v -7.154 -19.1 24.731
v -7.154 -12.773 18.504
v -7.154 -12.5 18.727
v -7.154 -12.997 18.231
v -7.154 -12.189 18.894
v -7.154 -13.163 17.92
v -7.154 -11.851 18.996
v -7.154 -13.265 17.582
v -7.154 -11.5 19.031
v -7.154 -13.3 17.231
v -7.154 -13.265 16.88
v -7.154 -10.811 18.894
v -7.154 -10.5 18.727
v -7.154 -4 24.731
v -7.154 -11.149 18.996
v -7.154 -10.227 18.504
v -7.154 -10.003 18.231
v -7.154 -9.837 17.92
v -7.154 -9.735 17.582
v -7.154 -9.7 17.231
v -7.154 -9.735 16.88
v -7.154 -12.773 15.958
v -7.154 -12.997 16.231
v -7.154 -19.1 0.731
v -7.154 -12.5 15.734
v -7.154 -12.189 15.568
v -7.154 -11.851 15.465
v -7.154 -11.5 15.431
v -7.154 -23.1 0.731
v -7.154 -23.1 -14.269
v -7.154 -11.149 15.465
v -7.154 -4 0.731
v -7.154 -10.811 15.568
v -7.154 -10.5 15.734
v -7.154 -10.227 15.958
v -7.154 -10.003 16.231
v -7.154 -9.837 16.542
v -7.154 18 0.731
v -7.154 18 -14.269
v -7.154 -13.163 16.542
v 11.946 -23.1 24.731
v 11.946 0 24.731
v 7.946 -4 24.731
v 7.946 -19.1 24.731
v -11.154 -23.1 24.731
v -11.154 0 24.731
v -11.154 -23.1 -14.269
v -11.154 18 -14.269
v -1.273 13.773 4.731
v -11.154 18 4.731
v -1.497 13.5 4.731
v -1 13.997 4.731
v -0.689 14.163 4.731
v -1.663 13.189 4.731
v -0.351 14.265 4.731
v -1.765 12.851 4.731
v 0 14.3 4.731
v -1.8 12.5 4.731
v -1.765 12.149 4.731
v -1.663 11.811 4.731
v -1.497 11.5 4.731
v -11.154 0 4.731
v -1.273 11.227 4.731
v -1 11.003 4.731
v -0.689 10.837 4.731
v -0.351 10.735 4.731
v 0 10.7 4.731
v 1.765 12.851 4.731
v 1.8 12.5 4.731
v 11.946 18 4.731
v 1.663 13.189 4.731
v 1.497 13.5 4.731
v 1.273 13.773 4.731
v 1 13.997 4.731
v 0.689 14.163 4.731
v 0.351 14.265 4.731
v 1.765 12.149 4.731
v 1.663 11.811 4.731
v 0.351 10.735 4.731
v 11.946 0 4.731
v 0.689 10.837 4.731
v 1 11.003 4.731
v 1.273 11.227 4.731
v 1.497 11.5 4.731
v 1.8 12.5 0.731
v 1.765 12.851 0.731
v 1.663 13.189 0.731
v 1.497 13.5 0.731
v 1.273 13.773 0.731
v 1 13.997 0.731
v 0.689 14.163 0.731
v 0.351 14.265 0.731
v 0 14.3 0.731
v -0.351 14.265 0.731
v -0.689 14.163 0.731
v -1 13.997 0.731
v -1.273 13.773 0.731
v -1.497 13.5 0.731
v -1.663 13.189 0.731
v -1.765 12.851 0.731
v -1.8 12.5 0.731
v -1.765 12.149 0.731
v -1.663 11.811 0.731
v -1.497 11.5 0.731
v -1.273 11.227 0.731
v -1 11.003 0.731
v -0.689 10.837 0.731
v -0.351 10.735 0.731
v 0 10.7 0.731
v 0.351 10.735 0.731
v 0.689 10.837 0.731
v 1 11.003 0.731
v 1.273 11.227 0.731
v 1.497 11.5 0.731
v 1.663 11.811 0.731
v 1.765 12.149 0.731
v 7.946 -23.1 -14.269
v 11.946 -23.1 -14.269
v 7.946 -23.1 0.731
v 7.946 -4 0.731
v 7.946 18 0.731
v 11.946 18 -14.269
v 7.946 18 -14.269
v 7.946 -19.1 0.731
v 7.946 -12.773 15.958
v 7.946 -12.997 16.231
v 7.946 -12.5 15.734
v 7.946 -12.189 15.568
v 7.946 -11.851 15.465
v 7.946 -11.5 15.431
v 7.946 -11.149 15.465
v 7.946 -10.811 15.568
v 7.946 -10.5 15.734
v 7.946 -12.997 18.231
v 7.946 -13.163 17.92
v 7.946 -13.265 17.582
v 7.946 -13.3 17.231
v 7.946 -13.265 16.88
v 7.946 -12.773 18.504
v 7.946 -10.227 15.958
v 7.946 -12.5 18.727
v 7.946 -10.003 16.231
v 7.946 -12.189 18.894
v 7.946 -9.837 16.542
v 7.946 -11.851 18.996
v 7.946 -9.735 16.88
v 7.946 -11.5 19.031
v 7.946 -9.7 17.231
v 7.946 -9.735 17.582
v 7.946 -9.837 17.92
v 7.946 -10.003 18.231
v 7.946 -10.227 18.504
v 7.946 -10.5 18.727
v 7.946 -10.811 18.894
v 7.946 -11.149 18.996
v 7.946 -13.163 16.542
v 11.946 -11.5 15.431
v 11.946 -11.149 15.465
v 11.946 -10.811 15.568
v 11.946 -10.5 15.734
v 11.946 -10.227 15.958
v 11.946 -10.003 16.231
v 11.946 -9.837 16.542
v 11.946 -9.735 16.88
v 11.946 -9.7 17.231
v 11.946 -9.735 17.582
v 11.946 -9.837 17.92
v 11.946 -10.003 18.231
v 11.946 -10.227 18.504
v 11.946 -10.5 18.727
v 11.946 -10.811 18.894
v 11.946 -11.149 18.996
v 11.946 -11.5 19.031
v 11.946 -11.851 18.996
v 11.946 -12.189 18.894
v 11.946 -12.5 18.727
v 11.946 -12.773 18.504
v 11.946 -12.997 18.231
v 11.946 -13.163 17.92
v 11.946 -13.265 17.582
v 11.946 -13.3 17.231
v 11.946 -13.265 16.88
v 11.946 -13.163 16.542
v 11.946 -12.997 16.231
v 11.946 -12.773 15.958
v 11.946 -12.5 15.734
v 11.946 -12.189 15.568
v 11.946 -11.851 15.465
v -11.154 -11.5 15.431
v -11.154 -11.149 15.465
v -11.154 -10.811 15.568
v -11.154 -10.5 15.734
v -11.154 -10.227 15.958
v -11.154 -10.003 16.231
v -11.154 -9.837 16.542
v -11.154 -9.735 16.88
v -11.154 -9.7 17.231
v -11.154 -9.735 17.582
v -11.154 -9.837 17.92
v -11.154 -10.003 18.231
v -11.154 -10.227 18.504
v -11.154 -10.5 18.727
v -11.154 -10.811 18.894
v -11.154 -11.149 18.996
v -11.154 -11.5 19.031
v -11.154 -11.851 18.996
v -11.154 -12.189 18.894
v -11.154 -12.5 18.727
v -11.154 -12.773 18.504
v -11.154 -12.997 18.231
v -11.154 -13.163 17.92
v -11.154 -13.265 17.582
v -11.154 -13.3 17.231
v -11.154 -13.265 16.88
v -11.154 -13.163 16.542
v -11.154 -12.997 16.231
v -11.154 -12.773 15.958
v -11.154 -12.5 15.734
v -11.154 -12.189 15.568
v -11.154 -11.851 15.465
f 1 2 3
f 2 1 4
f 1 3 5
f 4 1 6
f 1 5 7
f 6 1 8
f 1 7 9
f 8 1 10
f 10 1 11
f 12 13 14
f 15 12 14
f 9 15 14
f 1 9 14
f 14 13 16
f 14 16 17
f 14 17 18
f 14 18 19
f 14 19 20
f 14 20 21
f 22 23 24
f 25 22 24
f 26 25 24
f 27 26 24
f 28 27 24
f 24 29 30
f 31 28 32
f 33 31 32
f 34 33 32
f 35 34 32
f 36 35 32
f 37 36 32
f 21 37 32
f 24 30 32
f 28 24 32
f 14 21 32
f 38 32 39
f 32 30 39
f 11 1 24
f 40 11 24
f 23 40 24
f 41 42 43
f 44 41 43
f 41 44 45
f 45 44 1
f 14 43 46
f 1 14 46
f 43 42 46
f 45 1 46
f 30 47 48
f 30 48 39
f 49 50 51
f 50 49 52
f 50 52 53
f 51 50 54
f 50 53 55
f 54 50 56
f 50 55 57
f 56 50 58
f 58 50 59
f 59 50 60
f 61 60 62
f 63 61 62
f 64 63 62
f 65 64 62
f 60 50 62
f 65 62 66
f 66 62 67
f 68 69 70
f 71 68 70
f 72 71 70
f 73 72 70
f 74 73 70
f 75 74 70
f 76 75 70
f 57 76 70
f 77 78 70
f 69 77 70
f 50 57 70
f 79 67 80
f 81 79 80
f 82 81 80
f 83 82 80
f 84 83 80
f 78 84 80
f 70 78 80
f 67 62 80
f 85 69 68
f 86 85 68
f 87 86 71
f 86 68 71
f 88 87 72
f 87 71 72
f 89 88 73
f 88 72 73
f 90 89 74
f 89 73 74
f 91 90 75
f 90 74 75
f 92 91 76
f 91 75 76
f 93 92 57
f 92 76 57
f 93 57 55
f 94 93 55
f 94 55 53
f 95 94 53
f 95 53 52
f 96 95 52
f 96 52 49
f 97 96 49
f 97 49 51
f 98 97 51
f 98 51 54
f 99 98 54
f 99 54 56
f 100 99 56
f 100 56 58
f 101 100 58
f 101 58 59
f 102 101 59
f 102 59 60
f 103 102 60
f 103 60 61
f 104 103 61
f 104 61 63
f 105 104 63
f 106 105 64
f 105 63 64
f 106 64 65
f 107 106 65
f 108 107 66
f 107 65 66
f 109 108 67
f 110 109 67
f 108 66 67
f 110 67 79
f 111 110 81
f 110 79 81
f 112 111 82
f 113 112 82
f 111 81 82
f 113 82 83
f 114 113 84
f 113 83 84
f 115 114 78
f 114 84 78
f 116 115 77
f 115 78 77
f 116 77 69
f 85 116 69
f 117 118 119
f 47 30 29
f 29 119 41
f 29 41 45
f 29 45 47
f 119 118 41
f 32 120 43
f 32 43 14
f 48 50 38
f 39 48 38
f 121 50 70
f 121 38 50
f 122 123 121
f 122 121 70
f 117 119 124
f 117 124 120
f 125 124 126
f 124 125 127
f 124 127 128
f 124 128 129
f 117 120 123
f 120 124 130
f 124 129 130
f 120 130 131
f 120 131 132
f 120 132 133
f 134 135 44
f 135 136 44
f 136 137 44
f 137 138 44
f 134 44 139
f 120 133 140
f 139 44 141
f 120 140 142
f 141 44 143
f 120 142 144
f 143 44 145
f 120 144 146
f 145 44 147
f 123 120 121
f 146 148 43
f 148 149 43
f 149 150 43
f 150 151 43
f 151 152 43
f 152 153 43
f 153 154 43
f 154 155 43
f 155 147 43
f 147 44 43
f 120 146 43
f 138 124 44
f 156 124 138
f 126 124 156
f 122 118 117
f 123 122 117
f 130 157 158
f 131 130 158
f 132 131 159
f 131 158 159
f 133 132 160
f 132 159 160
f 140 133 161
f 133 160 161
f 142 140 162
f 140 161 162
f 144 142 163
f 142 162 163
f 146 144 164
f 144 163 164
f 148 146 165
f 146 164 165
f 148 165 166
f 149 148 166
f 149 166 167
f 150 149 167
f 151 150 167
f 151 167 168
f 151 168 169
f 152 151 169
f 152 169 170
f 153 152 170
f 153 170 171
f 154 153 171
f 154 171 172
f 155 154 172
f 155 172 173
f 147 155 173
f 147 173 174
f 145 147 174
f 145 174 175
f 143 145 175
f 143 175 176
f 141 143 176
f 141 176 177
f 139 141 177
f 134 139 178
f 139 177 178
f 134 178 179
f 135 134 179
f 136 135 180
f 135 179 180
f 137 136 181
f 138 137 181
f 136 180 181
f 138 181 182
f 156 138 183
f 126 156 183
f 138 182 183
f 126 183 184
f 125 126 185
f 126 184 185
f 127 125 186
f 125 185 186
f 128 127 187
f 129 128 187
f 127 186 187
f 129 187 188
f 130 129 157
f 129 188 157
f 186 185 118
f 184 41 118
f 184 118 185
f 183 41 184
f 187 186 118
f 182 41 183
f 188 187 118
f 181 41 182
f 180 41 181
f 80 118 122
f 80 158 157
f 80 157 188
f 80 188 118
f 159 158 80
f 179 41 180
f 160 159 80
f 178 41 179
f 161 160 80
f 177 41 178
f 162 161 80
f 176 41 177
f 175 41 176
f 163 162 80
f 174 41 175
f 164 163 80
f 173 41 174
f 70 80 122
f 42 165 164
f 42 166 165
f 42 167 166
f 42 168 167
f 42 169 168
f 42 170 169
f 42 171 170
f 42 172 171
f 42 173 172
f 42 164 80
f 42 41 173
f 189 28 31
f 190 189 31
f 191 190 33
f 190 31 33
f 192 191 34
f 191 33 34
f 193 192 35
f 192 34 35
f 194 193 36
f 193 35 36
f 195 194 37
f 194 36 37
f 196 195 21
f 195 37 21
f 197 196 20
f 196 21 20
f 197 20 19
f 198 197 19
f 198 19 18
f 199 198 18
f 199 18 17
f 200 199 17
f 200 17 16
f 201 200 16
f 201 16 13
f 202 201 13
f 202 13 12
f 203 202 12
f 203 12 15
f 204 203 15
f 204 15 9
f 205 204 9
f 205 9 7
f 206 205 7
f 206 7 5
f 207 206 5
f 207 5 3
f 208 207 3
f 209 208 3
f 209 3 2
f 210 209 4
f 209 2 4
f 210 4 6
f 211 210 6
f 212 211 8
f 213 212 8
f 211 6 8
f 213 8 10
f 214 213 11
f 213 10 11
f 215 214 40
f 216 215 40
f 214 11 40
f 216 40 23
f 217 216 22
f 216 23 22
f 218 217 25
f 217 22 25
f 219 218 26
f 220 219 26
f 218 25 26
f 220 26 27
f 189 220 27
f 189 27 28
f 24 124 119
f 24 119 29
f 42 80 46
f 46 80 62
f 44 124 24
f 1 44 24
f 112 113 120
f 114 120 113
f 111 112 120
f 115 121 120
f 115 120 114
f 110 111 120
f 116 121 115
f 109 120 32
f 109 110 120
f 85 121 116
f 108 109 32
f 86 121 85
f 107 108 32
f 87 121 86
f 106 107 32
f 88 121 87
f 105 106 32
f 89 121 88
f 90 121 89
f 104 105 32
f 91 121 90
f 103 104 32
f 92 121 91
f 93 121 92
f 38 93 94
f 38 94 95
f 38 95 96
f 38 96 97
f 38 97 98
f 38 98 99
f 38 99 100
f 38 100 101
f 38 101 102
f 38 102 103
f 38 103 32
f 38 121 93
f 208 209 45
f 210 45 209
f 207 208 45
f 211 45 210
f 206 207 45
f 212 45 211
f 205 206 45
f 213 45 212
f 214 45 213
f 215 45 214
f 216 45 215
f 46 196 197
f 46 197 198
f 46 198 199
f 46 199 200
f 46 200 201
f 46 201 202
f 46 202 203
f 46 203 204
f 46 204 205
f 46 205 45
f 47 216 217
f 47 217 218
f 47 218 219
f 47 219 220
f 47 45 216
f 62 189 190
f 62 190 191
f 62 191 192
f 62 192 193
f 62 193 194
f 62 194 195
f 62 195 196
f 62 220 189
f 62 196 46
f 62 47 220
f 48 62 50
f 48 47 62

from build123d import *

# Parameters (mm, degrees)
EXTRUDE_1_DEPTH     = 20
SKETCH_2_W          = 23.1
SKETCH_2_H          = 23.1
SKETCH_2_W_2        = 15.1
SKETCH_2_H_2        = 15.1
EXTRUDE_2_DEPTH     = 24
SKETCH_3_W          = 4
SKETCH_3_H          = 23.1
EXTRUDE_3_DEPTH     = 15
SKETCH_4_R          = 1.8
CUT_EXTRUDE_1_DEPTH = 15
SKETCH_5_R          = 1.8
CUT_EXTRUDE_2_DEPTH = 35
SKETCH_6_W          = 23.1
SKETCH_6_H          = 19
CUT_EXTRUDE_3_DEPTH = 2


with BuildPart() as part:
    # 草图1 → 凸台-拉伸1 (new body)
    with BuildSketch(Plane(origin=(0, 0, 0), x_dir=(1, 0, 0), z_dir=(0, 1, 0))):
        Polygon((-11.153846154, 14.269230769), (-7.153846154, 14.269230769), (-7.153846154, -0.730769231), (7.946153846, -0.730769231), (7.946153846, 14.269230769), (11.946153846, 14.269230769), (11.946153846, -0.730769231), (11.946153846, -4.730769231), (-7.384615385, -4.730769231), (-11.153846154, -4.730769231), align=None)
    extrude(amount=EXTRUDE_1_DEPTH)

    # 草图2 → 凸台-拉伸2 (add)
    with BuildSketch(Plane(origin=(0, 0, 0.730769231), x_dir=(-1, 0, 0), z_dir=(0, 0, -1))):
        with Locations((-0.396153846, -11.55)):
            Rectangle(SKETCH_2_W, SKETCH_2_H)
        with Locations((-0.396153846, -11.55)):
            Rectangle(SKETCH_2_W_2, SKETCH_2_H_2, mode=Mode.SUBTRACT)
    extrude(amount=-EXTRUDE_2_DEPTH)

    # 草图3 → 凸台-拉伸3 (add)
    with BuildSketch(Plane(origin=(0, 0, 0.730769231), x_dir=(-1, 0, 0), z_dir=(0, 0, -1))):
        with Locations((-9.946153846, -11.55)):
            Rectangle(SKETCH_3_W, SKETCH_3_H)
        with Locations((9.153846154, -11.55)):
            Rectangle(SKETCH_3_W, SKETCH_3_H)
    extrude(amount=EXTRUDE_3_DEPTH)

    # 草图4 → 切除-拉伸1 (cut)
    with BuildSketch(Plane.XY.offset(4.730769231)):
        with Locations((0, 12.5)):
            Circle(SKETCH_4_R)
    extrude(amount=-CUT_EXTRUDE_1_DEPTH, mode=Mode.SUBTRACT)

    # 草图5 → 切除-拉伸2 (cut)
    with BuildSketch(Plane(origin=(11.946153846, 0, 0), x_dir=(0, 0, -1), z_dir=(1, 0, 0))):
        with Locations((-17.230769231, -11.5)):
            Circle(SKETCH_5_R)
    extrude(amount=-CUT_EXTRUDE_2_DEPTH, mode=Mode.SUBTRACT)

    # 草图6 → 切除-拉伸3 (cut)
    with BuildSketch(Plane(origin=(0, 20, 0), x_dir=(1, 0, 0), z_dir=(0, 1, 0))):
        with Locations((0.396153846, 4.769230769)):
            Rectangle(SKETCH_6_W, SKETCH_6_H)
    extrude(amount=-CUT_EXTRUDE_3_DEPTH, mode=Mode.SUBTRACT)


solid = part.part
